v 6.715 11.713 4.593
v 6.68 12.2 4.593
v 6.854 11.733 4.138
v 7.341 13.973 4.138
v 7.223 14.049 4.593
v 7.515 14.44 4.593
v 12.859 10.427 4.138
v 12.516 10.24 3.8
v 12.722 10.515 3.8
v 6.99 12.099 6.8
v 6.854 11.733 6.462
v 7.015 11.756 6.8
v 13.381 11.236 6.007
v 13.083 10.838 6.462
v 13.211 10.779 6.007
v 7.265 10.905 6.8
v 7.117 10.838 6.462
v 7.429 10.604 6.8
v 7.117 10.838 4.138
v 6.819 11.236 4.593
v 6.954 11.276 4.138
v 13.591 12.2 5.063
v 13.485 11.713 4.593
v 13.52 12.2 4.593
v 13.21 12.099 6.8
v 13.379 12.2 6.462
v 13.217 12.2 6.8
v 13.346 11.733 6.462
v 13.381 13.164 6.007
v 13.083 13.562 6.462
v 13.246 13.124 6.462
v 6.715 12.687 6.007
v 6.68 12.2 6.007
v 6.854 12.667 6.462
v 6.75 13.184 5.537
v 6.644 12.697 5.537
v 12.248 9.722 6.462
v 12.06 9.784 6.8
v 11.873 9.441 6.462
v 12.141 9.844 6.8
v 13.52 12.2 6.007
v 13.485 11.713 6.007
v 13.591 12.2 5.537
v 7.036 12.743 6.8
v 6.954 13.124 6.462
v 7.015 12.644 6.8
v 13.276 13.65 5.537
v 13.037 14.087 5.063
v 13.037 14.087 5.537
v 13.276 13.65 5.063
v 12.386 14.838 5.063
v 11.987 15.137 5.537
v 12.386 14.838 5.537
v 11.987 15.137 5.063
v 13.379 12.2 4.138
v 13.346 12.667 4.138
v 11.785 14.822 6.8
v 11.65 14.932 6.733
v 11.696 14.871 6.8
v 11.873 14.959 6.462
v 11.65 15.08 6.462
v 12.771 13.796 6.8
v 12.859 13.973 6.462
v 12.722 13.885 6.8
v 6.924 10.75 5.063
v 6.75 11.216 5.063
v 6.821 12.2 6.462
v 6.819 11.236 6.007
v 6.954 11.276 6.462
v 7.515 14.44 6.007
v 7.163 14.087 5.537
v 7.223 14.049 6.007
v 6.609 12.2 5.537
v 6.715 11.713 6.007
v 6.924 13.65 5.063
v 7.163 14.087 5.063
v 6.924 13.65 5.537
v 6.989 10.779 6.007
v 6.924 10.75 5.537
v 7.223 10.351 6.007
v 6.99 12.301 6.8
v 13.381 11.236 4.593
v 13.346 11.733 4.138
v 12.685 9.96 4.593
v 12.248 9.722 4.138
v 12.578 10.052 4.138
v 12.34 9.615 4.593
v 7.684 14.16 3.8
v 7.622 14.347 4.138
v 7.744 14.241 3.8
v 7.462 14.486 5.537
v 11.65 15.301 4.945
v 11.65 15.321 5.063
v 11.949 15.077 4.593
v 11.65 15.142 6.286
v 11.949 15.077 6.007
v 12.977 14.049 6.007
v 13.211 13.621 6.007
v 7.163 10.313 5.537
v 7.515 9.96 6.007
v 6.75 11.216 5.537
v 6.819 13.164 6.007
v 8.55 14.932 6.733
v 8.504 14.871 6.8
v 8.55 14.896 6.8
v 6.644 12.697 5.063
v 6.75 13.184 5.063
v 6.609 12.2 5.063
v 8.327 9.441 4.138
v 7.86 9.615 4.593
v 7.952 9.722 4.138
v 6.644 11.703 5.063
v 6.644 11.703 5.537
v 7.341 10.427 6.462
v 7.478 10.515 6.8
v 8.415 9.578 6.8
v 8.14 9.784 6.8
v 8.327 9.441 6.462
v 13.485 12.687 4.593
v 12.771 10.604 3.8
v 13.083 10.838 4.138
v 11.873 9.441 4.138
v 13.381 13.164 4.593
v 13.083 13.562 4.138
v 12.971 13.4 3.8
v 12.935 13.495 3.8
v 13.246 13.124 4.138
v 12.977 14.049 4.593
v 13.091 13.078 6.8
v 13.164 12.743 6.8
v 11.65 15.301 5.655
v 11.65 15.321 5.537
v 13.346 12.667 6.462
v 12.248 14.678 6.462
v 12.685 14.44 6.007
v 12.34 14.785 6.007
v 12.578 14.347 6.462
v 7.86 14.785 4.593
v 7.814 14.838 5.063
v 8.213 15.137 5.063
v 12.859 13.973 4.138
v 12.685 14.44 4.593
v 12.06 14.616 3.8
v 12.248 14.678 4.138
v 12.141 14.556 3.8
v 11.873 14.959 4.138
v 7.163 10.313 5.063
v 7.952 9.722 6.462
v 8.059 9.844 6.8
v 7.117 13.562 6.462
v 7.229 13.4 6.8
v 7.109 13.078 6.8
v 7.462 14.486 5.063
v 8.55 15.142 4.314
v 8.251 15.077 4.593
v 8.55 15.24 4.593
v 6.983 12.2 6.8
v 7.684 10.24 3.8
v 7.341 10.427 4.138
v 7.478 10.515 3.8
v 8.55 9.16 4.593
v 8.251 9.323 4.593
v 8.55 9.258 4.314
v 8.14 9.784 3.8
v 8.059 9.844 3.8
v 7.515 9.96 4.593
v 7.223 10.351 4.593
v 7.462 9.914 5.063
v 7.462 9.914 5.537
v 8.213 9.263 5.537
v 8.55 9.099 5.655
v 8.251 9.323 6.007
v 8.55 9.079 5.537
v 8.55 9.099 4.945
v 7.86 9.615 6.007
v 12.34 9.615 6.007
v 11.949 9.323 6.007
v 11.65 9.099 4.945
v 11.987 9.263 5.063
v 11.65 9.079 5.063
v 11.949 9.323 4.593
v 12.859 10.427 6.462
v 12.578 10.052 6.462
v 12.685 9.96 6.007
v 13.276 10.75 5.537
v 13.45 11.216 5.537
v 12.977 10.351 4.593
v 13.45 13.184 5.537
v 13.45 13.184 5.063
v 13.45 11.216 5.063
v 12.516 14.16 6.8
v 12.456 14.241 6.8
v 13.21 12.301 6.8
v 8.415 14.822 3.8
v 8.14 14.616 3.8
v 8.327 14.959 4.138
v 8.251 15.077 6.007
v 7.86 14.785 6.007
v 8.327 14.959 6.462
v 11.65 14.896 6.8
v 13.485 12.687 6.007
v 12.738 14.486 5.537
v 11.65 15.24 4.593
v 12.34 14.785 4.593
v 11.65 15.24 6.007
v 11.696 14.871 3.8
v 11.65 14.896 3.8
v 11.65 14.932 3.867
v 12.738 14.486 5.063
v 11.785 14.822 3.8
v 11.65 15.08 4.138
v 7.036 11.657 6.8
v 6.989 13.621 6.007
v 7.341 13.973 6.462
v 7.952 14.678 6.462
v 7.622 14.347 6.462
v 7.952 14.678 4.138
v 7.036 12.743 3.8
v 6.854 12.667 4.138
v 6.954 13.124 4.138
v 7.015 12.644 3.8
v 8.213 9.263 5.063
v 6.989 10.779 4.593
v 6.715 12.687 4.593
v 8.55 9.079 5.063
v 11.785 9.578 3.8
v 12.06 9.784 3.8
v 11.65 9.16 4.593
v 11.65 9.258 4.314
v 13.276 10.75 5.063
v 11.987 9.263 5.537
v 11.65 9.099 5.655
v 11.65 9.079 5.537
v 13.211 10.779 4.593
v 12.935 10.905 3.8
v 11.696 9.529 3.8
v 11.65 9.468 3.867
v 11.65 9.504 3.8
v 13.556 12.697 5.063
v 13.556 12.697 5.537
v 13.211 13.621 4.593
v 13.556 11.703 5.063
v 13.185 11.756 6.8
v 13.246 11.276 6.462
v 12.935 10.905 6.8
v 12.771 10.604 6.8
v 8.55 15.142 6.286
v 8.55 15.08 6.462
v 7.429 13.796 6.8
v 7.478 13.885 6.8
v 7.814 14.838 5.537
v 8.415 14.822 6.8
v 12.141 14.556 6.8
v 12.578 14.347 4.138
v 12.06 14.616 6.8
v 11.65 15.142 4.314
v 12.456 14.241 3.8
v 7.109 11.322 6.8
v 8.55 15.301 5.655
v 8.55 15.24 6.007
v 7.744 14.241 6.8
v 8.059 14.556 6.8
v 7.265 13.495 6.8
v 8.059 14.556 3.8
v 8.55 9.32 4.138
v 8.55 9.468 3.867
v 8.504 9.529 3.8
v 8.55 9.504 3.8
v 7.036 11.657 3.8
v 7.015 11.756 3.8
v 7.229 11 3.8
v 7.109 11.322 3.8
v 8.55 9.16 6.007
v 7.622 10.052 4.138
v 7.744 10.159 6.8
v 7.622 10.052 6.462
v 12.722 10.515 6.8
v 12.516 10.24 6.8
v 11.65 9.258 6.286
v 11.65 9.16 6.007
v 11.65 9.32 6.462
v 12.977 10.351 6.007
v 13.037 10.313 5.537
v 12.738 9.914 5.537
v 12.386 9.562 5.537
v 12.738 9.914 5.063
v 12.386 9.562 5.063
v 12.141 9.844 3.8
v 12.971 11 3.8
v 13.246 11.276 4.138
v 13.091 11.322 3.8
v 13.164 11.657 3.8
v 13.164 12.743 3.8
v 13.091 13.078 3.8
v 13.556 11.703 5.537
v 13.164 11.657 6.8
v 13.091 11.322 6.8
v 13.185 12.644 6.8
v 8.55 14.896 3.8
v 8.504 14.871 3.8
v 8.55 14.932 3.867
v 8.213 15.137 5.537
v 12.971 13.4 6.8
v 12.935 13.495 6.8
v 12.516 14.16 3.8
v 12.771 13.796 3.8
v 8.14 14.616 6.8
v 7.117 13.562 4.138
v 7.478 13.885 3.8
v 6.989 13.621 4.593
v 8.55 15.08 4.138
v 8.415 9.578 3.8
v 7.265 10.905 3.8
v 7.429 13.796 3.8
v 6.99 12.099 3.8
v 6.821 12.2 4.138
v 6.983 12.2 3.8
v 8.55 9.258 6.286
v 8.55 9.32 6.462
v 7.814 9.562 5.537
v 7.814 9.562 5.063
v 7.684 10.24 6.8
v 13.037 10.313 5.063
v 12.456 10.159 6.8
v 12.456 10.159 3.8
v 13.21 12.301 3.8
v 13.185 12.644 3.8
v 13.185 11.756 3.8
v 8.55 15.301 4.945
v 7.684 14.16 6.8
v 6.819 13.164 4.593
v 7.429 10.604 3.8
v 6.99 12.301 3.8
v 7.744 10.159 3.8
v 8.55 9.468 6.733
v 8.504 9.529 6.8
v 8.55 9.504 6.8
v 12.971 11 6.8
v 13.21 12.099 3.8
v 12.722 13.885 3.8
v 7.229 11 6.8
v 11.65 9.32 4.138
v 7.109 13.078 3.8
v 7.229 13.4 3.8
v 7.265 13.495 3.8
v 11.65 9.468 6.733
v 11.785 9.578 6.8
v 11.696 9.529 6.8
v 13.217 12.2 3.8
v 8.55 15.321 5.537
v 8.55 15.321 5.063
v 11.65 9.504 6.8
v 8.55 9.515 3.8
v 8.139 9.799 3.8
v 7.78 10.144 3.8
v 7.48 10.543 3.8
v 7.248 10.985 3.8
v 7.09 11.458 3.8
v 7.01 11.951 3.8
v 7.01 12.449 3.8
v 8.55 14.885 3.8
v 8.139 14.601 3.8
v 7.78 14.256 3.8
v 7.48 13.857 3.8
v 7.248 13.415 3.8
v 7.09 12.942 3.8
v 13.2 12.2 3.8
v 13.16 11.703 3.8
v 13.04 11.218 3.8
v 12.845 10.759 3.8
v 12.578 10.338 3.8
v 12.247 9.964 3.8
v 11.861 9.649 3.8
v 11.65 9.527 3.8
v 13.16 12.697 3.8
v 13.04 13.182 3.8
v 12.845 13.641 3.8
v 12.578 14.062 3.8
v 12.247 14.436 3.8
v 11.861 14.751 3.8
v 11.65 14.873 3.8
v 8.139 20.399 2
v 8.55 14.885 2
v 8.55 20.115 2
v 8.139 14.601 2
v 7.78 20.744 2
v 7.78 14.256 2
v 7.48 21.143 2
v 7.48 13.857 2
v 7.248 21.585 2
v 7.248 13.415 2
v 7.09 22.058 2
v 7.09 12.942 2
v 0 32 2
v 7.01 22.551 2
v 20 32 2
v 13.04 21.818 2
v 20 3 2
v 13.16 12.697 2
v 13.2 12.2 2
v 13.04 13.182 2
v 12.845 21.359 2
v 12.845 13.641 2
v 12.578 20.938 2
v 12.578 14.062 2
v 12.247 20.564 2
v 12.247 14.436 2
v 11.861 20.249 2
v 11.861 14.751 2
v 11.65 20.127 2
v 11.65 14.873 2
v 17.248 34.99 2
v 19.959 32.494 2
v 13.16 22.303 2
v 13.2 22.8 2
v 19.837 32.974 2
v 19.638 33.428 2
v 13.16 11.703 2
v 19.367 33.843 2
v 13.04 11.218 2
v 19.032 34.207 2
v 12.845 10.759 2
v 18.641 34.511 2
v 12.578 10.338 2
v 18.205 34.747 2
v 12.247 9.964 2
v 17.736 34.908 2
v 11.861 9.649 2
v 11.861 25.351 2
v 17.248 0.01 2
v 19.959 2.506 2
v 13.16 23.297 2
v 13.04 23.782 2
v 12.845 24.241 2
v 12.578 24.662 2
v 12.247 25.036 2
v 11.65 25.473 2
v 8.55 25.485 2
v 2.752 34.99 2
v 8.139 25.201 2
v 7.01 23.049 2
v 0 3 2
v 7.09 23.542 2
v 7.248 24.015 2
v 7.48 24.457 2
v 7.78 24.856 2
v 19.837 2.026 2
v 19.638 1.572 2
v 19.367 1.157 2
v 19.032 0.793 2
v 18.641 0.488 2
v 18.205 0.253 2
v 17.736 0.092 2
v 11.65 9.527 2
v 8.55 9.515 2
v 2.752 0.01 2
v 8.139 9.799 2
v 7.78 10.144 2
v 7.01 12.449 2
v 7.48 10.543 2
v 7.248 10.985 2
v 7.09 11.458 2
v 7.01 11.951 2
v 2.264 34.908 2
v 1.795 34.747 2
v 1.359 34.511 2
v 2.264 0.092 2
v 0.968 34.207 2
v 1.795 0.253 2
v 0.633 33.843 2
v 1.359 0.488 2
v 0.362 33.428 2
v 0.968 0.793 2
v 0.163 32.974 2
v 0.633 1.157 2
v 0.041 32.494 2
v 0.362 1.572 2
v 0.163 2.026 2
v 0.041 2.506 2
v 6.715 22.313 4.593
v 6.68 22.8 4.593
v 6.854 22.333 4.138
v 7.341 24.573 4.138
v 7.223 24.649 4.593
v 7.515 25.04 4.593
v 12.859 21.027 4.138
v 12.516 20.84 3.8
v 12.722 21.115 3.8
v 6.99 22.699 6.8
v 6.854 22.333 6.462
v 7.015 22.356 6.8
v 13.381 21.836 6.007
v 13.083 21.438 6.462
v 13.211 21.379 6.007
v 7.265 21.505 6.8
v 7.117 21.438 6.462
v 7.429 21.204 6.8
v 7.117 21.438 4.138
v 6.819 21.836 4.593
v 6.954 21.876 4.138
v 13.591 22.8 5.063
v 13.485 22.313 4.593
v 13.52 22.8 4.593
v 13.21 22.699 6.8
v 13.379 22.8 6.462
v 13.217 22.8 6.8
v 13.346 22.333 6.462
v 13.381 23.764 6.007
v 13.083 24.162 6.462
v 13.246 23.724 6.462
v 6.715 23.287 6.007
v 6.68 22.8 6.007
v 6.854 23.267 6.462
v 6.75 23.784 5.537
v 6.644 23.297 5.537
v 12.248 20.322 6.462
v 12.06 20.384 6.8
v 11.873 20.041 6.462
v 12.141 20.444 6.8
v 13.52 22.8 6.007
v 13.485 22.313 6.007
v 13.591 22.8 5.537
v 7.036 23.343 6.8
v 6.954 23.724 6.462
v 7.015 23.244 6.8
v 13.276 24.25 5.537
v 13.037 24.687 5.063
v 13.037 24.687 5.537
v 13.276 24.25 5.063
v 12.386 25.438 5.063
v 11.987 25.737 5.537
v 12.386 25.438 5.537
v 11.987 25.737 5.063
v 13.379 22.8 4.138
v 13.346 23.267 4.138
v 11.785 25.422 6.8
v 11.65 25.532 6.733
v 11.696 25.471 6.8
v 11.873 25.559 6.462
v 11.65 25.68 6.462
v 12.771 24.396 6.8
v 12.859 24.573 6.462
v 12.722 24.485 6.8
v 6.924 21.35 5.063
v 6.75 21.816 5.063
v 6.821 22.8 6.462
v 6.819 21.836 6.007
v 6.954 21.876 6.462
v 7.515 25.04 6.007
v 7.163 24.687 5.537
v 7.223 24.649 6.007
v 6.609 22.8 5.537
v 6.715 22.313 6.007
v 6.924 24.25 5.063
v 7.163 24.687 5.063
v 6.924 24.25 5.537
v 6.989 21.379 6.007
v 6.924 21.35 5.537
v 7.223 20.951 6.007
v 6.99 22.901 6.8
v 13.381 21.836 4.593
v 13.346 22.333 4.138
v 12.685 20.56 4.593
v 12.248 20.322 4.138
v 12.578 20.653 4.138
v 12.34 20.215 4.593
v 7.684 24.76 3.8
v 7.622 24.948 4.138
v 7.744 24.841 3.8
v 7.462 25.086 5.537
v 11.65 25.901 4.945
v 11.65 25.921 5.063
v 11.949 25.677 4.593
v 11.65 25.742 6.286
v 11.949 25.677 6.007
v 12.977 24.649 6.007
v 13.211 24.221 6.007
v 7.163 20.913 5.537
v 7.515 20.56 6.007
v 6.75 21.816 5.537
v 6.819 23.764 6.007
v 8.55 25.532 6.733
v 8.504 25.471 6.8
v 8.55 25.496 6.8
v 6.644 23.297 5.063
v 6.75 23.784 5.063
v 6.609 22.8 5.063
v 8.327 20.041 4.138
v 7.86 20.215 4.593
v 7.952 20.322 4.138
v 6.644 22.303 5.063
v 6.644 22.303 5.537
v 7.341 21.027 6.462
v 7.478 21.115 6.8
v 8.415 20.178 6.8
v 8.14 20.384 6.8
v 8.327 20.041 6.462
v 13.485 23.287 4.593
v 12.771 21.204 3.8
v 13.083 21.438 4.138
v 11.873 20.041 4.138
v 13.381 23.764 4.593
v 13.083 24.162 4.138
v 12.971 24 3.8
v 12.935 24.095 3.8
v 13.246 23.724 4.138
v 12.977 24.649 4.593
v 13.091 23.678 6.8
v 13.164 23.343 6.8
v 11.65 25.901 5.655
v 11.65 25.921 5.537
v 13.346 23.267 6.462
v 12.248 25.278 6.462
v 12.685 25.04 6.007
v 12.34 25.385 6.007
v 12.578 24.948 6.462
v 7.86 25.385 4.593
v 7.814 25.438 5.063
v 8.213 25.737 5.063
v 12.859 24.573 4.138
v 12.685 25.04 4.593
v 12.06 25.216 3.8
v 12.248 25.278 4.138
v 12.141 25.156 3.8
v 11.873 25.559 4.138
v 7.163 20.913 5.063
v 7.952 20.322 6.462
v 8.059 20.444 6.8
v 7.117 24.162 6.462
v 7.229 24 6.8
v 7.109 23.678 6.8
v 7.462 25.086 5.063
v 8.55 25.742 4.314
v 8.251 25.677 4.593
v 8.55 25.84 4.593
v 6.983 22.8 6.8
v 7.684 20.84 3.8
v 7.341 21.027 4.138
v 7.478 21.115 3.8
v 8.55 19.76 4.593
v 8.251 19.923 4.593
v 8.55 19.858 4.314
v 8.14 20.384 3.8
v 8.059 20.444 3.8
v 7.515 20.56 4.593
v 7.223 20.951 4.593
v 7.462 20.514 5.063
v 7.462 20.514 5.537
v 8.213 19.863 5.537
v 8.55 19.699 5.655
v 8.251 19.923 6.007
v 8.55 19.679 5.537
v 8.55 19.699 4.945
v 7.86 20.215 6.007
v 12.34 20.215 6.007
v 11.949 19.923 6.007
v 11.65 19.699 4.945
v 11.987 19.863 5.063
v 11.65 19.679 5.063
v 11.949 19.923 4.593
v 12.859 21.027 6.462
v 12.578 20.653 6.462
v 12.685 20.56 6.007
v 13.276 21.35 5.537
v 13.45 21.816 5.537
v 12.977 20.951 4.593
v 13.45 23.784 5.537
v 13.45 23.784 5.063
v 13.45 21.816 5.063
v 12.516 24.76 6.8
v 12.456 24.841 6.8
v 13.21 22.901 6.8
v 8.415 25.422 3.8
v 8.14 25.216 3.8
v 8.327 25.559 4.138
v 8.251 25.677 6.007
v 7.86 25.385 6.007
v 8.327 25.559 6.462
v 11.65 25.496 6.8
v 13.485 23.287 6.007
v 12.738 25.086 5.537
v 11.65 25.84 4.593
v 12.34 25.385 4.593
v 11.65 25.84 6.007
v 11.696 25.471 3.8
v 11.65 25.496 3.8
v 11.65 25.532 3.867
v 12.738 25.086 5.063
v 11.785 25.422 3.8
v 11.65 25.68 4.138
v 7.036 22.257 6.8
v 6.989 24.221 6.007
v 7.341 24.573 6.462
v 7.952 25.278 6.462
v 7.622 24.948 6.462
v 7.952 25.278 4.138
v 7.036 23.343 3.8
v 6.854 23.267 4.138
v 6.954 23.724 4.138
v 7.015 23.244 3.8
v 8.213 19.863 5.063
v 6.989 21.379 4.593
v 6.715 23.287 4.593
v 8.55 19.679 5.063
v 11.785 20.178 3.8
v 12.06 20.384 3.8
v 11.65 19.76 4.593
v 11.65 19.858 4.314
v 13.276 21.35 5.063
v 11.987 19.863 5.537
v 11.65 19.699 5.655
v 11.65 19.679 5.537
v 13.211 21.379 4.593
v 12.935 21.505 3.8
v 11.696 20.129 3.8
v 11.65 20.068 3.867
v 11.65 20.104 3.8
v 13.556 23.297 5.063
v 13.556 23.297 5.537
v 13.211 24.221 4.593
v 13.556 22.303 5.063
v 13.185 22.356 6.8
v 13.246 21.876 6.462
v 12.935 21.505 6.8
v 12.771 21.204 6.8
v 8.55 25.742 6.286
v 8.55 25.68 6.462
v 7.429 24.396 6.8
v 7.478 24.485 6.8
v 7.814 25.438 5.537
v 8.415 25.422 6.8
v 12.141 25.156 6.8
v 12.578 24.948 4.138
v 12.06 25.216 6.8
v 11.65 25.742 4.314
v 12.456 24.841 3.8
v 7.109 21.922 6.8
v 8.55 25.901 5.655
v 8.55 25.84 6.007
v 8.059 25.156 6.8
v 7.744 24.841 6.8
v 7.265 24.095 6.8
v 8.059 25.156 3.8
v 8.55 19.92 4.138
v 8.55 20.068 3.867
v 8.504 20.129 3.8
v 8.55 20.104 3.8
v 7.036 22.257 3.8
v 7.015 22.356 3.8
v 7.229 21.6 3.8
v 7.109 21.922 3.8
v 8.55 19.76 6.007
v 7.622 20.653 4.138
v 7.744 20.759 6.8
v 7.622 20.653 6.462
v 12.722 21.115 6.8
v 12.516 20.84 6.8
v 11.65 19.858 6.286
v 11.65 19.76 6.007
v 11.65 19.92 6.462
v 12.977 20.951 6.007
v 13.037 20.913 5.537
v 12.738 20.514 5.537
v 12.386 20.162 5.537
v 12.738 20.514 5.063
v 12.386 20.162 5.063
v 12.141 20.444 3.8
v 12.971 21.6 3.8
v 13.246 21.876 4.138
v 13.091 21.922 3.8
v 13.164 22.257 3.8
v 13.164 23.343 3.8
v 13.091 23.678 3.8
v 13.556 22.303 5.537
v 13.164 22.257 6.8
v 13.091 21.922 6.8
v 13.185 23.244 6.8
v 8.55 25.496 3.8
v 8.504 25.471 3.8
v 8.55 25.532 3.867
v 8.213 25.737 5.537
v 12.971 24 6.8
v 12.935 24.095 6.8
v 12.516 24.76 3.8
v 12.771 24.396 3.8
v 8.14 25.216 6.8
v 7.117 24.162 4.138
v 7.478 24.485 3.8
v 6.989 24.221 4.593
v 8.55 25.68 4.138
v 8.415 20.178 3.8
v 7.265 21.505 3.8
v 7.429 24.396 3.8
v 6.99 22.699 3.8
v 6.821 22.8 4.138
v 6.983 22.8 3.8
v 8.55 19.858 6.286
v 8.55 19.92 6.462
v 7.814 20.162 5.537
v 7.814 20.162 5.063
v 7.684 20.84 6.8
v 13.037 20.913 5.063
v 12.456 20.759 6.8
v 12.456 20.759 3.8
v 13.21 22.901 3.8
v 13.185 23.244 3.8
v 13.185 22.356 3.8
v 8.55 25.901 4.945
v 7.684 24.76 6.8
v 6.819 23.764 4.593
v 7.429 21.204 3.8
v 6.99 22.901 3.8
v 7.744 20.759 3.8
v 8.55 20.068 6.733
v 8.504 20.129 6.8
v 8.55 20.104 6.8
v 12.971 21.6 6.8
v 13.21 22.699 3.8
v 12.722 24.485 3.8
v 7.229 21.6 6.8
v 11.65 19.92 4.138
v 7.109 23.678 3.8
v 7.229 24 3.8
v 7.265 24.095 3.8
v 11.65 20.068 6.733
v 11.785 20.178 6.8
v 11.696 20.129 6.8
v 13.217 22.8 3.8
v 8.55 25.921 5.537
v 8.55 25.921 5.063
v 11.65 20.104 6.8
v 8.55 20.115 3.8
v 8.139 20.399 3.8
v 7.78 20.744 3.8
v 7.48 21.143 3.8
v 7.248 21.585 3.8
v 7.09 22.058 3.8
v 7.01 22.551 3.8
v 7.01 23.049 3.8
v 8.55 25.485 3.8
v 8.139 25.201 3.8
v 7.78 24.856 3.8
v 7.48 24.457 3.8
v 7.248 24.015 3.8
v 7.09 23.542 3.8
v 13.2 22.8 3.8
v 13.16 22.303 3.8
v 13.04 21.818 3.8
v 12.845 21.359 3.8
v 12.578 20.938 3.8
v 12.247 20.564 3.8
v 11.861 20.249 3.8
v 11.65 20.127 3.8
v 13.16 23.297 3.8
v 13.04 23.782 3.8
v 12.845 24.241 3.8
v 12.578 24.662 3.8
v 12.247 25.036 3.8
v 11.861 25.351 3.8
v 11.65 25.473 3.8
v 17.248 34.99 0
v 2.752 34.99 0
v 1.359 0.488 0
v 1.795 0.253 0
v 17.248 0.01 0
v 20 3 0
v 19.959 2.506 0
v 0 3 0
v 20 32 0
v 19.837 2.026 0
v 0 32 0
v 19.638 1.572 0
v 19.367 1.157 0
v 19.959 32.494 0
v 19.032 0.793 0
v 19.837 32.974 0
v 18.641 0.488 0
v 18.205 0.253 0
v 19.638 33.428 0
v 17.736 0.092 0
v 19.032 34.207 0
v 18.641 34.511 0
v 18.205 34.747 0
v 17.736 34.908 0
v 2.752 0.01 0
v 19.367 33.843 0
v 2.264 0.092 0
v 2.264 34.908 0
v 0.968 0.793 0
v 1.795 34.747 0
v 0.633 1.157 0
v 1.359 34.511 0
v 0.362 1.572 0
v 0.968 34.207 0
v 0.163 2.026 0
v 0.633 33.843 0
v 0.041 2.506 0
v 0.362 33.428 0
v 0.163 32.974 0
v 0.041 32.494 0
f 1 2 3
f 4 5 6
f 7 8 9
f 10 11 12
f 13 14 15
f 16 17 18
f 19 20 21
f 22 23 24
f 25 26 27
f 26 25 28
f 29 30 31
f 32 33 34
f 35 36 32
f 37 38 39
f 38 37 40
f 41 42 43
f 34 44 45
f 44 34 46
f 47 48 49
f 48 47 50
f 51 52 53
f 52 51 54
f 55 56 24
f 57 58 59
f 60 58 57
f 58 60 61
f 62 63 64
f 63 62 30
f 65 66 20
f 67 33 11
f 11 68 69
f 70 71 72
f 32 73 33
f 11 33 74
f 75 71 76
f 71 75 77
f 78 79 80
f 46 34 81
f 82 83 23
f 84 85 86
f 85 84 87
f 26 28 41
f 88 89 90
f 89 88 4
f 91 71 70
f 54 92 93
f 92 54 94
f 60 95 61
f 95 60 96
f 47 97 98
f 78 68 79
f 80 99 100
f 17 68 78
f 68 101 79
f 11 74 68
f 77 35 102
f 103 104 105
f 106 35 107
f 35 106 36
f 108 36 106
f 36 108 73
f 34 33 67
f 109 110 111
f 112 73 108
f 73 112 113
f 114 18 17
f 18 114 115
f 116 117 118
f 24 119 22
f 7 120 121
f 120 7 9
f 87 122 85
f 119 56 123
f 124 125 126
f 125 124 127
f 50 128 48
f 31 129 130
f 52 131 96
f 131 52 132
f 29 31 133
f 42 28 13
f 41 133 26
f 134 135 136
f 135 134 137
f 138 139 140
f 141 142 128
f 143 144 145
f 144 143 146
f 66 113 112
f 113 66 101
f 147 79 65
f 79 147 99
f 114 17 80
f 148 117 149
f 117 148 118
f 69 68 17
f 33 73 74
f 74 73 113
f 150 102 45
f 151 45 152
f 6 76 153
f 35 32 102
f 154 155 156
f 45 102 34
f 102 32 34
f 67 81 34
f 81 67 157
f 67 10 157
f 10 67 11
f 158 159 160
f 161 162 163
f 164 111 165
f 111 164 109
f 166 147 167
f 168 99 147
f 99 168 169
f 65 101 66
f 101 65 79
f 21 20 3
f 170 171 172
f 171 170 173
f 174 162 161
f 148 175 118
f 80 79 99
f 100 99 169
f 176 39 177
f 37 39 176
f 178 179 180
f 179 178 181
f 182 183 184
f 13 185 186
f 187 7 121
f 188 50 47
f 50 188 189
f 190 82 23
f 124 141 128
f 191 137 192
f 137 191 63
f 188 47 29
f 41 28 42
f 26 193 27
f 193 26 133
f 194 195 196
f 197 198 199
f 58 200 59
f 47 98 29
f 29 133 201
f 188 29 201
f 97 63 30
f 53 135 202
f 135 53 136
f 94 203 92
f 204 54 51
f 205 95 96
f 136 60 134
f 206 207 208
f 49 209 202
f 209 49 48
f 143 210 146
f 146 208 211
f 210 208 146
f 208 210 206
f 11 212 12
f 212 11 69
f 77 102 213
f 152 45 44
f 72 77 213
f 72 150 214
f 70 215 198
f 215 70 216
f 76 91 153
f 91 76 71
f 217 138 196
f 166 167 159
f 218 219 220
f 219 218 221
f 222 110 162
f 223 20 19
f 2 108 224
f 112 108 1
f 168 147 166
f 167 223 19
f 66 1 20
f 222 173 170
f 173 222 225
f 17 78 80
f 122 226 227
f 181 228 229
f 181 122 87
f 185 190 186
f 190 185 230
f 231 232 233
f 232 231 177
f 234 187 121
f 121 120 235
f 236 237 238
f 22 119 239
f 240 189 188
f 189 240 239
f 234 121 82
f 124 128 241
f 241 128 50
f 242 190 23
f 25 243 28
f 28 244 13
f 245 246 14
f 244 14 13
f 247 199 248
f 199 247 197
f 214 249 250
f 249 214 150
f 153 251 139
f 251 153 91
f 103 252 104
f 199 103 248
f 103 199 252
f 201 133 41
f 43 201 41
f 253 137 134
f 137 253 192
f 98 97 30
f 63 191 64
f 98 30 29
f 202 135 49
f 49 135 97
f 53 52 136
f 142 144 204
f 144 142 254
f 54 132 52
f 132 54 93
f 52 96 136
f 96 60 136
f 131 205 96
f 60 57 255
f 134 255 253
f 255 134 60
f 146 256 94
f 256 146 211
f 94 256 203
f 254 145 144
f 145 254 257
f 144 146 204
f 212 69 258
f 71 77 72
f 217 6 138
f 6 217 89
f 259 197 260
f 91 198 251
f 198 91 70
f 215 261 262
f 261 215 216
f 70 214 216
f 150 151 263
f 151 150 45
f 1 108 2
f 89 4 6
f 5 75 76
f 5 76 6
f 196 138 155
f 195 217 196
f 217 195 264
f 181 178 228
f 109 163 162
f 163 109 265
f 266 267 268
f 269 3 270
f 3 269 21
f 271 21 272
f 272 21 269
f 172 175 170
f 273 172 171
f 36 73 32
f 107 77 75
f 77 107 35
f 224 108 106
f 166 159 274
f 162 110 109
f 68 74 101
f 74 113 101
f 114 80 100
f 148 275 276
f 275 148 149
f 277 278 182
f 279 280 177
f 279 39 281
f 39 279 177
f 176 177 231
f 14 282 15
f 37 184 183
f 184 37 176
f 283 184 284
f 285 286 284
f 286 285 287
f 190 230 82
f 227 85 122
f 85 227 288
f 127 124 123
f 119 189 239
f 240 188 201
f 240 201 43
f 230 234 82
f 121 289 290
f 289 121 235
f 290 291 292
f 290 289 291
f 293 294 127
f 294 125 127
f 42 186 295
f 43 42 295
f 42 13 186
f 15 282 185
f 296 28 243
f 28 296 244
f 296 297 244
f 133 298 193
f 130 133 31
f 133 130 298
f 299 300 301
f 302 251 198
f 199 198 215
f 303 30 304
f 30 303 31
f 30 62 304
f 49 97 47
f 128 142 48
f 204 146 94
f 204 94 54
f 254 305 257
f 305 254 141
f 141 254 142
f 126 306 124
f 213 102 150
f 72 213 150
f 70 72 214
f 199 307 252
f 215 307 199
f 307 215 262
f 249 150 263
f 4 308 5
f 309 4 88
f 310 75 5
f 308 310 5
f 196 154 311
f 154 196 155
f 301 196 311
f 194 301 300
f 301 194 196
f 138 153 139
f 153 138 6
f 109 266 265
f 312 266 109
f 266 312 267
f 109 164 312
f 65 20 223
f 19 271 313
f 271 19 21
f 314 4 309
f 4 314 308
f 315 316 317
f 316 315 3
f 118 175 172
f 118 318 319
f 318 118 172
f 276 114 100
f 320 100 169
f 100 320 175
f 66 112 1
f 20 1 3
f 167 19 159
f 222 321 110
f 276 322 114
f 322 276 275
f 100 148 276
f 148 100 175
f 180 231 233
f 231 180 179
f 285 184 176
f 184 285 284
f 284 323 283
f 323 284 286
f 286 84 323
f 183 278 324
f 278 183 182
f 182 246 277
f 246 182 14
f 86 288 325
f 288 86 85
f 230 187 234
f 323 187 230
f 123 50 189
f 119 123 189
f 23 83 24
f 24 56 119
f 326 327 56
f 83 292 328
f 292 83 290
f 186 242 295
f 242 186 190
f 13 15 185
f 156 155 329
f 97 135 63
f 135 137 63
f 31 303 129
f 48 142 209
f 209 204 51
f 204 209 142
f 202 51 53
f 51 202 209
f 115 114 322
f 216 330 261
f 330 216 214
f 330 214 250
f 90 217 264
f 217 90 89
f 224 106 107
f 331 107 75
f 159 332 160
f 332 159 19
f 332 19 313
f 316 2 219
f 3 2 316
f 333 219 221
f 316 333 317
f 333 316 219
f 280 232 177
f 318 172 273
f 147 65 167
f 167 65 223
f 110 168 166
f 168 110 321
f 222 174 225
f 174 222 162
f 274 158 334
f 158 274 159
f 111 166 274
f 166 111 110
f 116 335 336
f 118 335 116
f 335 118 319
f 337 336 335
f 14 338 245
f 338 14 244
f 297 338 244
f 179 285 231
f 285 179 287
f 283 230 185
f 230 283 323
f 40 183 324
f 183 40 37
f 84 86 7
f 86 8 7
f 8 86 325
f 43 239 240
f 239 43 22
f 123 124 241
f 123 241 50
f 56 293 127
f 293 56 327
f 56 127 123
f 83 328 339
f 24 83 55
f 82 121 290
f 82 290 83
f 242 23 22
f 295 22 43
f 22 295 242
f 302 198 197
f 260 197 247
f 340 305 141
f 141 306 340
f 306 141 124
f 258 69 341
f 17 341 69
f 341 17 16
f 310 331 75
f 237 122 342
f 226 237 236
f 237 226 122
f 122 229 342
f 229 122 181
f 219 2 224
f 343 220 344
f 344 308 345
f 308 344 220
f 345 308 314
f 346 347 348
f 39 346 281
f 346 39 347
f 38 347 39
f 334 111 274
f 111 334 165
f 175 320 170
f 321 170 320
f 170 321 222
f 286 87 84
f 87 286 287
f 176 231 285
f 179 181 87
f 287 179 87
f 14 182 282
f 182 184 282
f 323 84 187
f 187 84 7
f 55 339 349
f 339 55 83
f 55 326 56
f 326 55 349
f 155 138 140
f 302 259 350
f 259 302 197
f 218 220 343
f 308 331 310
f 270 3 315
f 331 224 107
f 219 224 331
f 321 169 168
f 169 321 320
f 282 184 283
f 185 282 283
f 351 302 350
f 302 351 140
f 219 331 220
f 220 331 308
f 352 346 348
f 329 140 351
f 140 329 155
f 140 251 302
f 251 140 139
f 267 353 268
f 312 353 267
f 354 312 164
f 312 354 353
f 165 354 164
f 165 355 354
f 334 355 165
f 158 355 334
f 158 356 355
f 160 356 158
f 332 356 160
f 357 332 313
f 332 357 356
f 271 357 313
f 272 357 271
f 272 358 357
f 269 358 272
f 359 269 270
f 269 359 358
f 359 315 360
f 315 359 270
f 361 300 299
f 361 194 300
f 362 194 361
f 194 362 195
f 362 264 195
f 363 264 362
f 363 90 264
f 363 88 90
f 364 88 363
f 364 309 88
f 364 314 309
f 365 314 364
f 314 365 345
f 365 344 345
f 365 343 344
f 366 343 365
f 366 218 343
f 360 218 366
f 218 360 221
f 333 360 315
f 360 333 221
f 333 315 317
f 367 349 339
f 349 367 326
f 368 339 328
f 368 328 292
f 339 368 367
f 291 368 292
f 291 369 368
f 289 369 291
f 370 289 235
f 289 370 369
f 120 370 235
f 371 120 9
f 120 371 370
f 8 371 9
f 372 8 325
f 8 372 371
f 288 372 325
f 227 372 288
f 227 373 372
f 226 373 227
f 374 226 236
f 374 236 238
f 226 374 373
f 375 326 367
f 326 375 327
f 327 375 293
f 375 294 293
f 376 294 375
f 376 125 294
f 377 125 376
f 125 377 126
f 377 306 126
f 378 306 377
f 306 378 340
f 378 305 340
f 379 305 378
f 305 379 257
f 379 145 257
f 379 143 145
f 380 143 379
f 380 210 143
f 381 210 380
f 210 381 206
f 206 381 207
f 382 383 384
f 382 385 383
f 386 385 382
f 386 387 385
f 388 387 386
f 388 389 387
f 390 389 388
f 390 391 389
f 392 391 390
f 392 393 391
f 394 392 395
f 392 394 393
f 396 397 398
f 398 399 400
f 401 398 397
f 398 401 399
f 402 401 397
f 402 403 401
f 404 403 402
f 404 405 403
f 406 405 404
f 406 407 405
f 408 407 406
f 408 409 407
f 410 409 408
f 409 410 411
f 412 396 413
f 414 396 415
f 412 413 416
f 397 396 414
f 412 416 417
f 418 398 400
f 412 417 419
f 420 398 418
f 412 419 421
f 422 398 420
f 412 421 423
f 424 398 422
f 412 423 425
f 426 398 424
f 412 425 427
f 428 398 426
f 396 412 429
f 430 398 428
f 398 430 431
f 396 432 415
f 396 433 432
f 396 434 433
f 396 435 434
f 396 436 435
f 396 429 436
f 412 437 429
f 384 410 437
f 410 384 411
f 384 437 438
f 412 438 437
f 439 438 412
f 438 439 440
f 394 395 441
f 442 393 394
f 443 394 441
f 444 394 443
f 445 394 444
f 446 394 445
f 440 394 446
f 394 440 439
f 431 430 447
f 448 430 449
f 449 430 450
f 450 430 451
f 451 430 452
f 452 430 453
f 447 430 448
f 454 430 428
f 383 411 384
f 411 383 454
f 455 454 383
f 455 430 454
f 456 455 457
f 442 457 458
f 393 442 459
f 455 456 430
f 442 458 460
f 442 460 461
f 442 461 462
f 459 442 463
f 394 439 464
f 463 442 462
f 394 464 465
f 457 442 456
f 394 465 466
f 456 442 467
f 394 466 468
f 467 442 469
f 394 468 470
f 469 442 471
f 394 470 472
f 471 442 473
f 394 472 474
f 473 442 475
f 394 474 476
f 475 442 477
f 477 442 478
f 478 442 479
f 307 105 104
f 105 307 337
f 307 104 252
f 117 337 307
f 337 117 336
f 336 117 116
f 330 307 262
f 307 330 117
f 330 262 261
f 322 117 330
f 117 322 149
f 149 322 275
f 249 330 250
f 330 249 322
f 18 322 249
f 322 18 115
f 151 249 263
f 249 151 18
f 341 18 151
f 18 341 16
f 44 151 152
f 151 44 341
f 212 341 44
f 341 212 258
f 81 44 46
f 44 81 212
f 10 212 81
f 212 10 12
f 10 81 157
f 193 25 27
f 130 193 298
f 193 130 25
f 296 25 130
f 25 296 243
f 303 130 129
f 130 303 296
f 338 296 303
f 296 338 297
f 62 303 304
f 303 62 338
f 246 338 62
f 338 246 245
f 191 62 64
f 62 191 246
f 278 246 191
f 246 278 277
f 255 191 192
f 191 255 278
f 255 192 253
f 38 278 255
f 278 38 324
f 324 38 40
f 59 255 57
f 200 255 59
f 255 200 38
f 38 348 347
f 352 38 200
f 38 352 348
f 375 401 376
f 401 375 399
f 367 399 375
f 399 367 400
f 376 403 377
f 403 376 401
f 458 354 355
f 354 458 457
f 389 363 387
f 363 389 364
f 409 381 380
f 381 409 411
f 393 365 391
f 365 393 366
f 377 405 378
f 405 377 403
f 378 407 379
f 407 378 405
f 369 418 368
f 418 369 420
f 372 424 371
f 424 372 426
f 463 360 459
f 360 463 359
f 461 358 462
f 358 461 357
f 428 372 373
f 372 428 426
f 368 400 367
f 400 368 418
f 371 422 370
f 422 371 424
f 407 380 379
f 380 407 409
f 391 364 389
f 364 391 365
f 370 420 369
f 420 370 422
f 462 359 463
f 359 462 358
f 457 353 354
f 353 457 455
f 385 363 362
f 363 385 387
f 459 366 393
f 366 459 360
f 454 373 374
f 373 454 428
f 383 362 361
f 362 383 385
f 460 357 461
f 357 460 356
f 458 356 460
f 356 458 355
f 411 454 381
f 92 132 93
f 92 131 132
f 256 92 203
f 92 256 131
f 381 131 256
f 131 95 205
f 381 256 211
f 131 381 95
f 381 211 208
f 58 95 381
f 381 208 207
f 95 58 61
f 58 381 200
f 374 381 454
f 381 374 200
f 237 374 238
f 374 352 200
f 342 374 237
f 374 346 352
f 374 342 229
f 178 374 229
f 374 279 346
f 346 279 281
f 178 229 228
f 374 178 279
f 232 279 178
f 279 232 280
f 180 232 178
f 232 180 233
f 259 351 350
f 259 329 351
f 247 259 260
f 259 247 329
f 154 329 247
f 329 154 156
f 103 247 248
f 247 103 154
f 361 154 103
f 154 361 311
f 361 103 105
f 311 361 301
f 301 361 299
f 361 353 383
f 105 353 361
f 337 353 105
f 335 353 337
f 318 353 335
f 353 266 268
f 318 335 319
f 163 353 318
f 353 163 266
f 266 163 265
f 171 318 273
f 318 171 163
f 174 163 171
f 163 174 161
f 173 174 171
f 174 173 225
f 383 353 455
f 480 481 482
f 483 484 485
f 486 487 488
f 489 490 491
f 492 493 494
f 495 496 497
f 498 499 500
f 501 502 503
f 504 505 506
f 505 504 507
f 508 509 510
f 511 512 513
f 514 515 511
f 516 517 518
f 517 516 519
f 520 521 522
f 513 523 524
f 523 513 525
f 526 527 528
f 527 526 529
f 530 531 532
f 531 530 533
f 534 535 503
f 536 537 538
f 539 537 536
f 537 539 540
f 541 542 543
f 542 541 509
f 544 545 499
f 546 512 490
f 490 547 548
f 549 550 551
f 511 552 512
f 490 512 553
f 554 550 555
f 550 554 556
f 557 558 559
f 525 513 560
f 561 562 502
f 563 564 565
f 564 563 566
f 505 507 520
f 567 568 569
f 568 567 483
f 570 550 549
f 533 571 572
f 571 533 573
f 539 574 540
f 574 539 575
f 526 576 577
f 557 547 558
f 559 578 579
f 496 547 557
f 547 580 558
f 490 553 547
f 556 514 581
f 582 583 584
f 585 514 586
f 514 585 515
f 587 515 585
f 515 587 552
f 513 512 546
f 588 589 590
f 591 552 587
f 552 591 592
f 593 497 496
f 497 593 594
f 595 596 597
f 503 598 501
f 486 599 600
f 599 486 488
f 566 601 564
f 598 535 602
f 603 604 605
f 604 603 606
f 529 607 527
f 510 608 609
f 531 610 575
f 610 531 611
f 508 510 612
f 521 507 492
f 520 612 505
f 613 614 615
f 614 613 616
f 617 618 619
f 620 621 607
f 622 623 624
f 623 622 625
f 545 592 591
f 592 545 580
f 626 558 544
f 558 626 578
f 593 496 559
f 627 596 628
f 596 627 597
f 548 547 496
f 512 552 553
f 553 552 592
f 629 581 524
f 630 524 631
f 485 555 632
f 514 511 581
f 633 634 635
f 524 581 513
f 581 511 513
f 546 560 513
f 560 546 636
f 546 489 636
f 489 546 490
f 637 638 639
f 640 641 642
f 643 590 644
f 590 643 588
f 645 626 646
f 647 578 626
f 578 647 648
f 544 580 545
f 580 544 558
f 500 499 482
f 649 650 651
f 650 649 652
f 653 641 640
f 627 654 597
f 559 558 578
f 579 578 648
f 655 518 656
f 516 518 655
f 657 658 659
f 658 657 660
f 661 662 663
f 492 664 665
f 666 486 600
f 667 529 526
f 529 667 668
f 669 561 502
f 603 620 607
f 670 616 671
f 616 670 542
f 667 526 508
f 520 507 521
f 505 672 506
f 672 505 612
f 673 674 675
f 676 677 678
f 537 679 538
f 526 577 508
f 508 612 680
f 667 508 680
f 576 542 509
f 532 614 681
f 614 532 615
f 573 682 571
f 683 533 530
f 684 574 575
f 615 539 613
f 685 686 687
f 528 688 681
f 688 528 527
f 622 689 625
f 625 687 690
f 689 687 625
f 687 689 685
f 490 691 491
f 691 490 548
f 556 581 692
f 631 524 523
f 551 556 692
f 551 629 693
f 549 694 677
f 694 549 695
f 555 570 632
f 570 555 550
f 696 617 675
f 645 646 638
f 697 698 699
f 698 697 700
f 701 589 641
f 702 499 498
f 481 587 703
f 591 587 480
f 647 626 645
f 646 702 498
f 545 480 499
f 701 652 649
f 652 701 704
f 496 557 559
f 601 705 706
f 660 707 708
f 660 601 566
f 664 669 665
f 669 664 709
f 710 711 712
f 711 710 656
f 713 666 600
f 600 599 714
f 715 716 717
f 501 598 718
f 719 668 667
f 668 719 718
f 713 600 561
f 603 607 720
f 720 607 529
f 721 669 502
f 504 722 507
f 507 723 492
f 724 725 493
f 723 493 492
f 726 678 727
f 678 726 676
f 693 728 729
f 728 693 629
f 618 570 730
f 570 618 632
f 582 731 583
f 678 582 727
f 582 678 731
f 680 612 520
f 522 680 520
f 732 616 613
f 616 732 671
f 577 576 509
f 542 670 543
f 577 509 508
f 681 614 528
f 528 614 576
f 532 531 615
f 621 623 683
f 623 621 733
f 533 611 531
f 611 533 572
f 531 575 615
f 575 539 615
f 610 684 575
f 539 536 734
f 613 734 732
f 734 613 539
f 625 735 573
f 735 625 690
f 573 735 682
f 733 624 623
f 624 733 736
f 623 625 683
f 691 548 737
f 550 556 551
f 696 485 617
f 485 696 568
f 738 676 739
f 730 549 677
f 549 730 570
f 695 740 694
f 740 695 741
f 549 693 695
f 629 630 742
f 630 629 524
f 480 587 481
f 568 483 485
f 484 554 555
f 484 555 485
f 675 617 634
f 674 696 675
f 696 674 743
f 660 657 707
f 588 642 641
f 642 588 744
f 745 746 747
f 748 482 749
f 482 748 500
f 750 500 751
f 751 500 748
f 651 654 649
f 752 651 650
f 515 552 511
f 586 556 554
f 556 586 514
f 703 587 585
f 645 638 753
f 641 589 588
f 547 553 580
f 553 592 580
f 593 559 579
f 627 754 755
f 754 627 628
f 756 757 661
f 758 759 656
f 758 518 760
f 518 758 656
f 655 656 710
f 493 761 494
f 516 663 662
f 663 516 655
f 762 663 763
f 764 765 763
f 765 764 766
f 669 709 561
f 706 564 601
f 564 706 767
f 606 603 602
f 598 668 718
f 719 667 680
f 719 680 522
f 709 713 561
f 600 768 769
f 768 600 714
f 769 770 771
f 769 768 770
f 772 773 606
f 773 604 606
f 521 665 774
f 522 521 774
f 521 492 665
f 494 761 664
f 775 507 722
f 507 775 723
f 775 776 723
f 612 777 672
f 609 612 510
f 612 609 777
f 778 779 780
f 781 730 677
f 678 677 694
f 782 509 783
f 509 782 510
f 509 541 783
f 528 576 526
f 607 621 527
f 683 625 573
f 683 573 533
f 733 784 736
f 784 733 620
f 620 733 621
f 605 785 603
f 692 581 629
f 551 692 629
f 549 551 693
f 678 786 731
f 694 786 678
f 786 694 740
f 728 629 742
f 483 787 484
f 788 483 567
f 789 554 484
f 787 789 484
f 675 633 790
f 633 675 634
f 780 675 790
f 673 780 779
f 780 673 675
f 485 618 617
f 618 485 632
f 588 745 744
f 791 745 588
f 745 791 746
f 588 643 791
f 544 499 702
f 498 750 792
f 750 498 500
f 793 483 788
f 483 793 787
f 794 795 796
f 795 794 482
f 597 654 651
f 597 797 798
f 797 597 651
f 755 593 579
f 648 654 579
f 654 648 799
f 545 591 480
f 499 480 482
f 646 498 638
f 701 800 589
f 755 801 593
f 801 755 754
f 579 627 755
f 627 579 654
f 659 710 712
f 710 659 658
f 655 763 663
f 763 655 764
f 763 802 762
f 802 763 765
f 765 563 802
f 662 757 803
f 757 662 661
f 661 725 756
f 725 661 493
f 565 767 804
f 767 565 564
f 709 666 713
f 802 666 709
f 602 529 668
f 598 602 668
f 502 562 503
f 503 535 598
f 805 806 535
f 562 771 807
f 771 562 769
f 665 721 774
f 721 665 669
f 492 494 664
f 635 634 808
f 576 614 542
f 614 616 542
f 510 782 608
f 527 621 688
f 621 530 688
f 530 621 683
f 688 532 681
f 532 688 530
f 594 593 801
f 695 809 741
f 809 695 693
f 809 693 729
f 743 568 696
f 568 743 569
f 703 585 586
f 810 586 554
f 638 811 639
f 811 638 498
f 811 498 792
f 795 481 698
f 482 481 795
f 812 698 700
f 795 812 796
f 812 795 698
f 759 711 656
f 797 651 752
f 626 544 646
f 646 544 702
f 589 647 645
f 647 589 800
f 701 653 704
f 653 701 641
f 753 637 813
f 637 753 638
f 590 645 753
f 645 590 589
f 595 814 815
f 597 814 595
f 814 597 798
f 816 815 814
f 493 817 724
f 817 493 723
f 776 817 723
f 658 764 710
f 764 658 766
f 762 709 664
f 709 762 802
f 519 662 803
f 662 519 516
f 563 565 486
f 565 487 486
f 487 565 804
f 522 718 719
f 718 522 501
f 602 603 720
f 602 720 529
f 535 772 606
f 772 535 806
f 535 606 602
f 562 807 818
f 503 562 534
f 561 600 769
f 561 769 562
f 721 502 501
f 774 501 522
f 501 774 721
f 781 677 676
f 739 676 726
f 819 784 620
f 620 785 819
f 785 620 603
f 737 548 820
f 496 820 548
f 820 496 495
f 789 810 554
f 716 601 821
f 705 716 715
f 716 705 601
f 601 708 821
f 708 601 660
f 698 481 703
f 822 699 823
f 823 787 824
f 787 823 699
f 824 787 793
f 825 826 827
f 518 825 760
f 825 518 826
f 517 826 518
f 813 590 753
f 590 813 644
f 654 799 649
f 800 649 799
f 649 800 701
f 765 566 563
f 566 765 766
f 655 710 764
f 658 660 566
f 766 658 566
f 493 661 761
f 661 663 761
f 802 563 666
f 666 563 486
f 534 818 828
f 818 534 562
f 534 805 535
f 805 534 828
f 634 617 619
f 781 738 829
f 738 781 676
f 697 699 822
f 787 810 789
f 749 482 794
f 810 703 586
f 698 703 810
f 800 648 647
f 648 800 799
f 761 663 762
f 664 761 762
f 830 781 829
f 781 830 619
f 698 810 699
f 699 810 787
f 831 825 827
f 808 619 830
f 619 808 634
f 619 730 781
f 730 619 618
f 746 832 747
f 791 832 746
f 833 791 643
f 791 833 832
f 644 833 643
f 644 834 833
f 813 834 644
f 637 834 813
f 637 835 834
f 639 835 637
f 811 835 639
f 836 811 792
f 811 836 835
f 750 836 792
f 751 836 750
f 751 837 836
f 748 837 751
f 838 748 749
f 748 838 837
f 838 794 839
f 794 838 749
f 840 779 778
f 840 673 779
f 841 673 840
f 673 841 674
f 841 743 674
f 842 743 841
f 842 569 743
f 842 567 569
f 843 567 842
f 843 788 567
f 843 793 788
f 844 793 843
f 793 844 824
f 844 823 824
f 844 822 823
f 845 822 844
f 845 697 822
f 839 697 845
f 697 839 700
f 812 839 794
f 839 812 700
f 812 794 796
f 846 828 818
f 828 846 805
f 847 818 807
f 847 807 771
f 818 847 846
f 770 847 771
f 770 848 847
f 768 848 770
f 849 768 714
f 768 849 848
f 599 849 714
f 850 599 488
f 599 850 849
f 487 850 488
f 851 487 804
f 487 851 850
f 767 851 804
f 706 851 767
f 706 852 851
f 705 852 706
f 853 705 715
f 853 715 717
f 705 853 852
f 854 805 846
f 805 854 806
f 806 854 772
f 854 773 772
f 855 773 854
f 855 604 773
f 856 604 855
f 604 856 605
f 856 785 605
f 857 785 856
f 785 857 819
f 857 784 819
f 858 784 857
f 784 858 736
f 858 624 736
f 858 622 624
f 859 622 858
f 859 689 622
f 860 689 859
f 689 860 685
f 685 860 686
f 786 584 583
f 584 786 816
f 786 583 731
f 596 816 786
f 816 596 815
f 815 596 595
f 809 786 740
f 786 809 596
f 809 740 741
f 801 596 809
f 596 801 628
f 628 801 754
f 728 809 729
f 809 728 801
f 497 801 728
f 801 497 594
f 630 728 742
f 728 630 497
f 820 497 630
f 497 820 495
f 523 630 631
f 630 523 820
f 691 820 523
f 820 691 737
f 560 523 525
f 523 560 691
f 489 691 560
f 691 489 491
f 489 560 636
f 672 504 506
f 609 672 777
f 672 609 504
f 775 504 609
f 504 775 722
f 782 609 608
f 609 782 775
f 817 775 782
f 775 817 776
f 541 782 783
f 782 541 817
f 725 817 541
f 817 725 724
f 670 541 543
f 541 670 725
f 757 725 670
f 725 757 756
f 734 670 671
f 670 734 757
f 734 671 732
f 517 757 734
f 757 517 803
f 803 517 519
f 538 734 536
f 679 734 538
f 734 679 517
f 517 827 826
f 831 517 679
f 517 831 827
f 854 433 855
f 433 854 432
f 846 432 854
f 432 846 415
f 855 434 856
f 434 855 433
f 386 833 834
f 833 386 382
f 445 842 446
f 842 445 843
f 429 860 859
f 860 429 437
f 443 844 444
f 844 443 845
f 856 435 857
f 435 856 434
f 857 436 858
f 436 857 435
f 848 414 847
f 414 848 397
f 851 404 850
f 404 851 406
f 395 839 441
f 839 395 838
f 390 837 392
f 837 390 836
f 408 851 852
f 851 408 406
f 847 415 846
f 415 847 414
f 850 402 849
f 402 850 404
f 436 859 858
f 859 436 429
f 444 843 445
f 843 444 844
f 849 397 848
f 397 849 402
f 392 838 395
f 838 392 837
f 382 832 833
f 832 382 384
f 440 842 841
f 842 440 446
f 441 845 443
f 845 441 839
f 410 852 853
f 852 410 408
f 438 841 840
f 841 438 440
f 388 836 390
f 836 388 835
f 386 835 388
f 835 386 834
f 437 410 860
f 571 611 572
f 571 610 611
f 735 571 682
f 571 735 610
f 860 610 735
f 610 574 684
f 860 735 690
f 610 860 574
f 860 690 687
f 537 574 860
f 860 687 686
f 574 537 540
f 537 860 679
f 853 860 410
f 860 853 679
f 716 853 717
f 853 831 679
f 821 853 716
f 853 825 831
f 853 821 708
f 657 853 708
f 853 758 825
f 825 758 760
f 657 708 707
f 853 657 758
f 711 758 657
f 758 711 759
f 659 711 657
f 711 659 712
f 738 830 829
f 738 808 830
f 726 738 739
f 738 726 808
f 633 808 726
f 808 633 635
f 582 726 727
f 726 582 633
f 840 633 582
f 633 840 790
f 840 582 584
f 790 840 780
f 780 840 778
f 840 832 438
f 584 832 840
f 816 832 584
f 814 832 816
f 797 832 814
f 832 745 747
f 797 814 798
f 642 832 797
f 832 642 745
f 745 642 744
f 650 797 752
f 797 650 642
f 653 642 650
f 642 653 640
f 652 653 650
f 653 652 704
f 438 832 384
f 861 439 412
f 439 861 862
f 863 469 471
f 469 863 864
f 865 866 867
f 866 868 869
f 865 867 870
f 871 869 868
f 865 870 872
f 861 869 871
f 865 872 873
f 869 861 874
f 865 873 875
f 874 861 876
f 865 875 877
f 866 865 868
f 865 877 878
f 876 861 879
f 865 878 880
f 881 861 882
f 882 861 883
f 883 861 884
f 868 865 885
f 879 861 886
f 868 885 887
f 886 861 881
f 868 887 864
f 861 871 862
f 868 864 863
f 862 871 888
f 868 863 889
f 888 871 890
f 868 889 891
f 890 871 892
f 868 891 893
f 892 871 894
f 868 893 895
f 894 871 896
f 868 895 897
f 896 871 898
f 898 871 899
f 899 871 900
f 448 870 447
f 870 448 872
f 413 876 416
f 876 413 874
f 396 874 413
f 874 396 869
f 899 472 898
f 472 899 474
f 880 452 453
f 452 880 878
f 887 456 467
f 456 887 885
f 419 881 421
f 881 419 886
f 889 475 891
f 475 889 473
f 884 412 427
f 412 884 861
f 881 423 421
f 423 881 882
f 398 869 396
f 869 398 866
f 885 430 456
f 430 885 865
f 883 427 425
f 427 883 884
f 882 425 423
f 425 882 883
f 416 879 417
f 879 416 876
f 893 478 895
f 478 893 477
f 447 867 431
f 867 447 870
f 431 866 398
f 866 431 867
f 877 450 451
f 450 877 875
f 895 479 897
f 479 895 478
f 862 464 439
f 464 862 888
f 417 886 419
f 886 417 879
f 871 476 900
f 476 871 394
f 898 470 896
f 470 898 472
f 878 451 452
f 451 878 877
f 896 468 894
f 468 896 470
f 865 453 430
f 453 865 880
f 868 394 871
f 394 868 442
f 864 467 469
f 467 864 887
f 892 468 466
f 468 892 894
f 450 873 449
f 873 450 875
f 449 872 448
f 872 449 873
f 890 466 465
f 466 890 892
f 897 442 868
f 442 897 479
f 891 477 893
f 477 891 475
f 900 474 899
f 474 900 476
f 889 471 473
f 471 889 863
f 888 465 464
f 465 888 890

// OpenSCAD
/**
Make 6 drawers that run the full drawer depth.
Assorted packs of resistors ordered from Amazon typically come in 30 denominations, so 5 drawers with 6 compartments is perfect for my needs

- costmo
- 2018-04-04
**/

// The surface dimensions of the cap
// The width of the cap (the edge that runs along the rail - if you want to entirely cover the wire path, make this the length of the run to cover)
capWidth = 35;
// The height of the cap (make this the rail's height or less) 
capHeight = 20;
// Width of the gap/space in the rail (the gap where your V-nuts/T-nuts slide into the rail, or a little smaller)
railGap = 6.2;
// How deep into the gap do we need to go to "catch." Make this tight to avoid adding a source of vibration.
gapReach = 1.8;
// When multiple insertion tabs are created, how far from the edge are the outer ones
multiTabInset = 6;

// The "catch" in the inertion tab is a ball. What is its diameter.
insertionCatchDiameter = 7.0;
// The height of the insertion catch ball. Leave enough room for wires to pass!
insertionCatchHeight = 3;

// How round to make the corners
cornerDiameter = 6;

// How thick to make the wall/cap
wallThickness = 2.0;

// How tall to make the post that snaps into the gap
gapPostHeight = gapReach;


// Rendering variables
// Minimum angle -- use for final rendering. Comment for preview.
$fa = 4; 
// Minimum size -- use for final rendering. Comment for preview.
$fs = 0.5; 

/* Calculated variables (these don't show in the Customizer) */
capDepth = wallThickness; // The depth of the cap

// adjust for corners
adjustedCapWidth = capWidth - cornerDiameter;
adjustedCapHeight = capHeight - cornerDiameter;

// The radius if the post to make in the rail gap for an insertion tab
gapPostDiameter = railGap;
// How wide to make the split in the insertion tab post
gapPostSplit = railGap * 0.5;


wireCover();

// The base unit that joins the pieces together
module wireCover()
{
    coverPlate();
    gapPosts();
}

// Make all of the insertion posts, based on the width of the piece.
// Break points are:
// Between 0 and 34   = 1 post
// Between 30 and 99 = 2 posts
// Everything larger  = 3 posts
module gapPosts()
{
    if( capWidth < 35 )
    {
        translate( [(adjustedCapHeight/2) + (gapPostDiameter/2), (adjustedCapWidth/2) + (gapPostDiameter/2), capDepth] )
        {
            gapPost();
        }
    }
    else if( capWidth < 100 )
    {
        translate( [(adjustedCapHeight/2) + (gapPostDiameter/2), (railGap + multiTabInset), capDepth] )
        {
            gapPost();
        }
        translate( [(adjustedCapHeight/2) + (gapPostDiameter/2), (capWidth - (railGap + multiTabInset)), capDepth] )
        {
            gapPost();
        }
    }
    else
    {
        translate( [(adjustedCapHeight/2) + (gapPostDiameter/2), (railGap + multiTabInset), capDepth] )
        {
            gapPost();
        }
        translate( [(adjustedCapHeight/2) + (gapPostDiameter/2), (adjustedCapWidth/2) + (gapPostDiameter/2), capDepth] )
        {
            gapPost();
        }
        translate( [(adjustedCapHeight/2) + (gapPostDiameter/2), (capWidth - (railGap + multiTabInset)), capDepth] )
        {
            gapPost();
        }
    }
}

// Make a single post
module gapPost()
{
    difference()
    {
        { // make a main body
            union()
            {
                {
                    // shaft
                    cylinder( d = gapPostDiameter, h = gapPostHeight );
                }
                {
                    difference()
                    {
                        {
                            
                            {
                                // ball at the top for tension
                                translate( [0, 0, (gapPostHeight + (insertionCatchHeight/2))] )
                                {
                                    scale( v = [1, 1, 0.95] )
                                    {
                                        sphere( d = insertionCatchDiameter );
                                    }
                                }
                            }
                        }
                        
                        { // remove the top and bottom of the ball at the set height
                            translate( [(-1 * (capHeight/2)), (-1 * (capWidth/2)), 0] )
                            {
                                cube( [capHeight, capWidth, gapPostHeight] );
                            }
                        }
                        {
                            translate( [(-1 * (capHeight/2)), (-1 * (capWidth/2)), gapPostHeight + insertionCatchHeight] )
                            {
                                cube( [capHeight, capWidth, gapPostHeight + 20] );
                            }
                        }
                        
                    }
                }
            }
        }
        { // Now remove a slice from the middle so the posts can squeeze together a little bit
            translate( [(-0.5 * gapPostSplit), (-0.5 * capWidth), 0] )
            {
                cube( [gapPostSplit, capWidth, 50] );
            }
        }
    }      
}

// Make the cover plate
module coverPlate()
{
    hull()
    {
        {
            translate( [(cornerDiameter/2), (cornerDiameter/2), 0] )
            {
                cube( [adjustedCapHeight, adjustedCapWidth, capDepth] );
            }
        }
        {
            coverPlateCorners();
        }
    }
            
}

// Convenience to add corners to the cover plate for hulling
module coverPlateCorners()
{
    translate( [(cornerDiameter/2), (cornerDiameter/2), 0] )
    {
        cylinder( d = cornerDiameter, h = capDepth );
    }
    
    translate( [(cornerDiameter/2) + adjustedCapHeight, (cornerDiameter/2), 0] )
    {
        cylinder( d = cornerDiameter, h = capDepth );
    }
    
    translate( [(cornerDiameter/2), (cornerDiameter/2) + adjustedCapWidth, 0] )
    {
        cylinder( d = cornerDiameter, h = capDepth );
    }
    
    translate( [(cornerDiameter/2) + adjustedCapHeight, (cornerDiameter/2) + adjustedCapWidth, 0] )
    {
        cylinder( d = cornerDiameter, h = capDepth );
    }
}
